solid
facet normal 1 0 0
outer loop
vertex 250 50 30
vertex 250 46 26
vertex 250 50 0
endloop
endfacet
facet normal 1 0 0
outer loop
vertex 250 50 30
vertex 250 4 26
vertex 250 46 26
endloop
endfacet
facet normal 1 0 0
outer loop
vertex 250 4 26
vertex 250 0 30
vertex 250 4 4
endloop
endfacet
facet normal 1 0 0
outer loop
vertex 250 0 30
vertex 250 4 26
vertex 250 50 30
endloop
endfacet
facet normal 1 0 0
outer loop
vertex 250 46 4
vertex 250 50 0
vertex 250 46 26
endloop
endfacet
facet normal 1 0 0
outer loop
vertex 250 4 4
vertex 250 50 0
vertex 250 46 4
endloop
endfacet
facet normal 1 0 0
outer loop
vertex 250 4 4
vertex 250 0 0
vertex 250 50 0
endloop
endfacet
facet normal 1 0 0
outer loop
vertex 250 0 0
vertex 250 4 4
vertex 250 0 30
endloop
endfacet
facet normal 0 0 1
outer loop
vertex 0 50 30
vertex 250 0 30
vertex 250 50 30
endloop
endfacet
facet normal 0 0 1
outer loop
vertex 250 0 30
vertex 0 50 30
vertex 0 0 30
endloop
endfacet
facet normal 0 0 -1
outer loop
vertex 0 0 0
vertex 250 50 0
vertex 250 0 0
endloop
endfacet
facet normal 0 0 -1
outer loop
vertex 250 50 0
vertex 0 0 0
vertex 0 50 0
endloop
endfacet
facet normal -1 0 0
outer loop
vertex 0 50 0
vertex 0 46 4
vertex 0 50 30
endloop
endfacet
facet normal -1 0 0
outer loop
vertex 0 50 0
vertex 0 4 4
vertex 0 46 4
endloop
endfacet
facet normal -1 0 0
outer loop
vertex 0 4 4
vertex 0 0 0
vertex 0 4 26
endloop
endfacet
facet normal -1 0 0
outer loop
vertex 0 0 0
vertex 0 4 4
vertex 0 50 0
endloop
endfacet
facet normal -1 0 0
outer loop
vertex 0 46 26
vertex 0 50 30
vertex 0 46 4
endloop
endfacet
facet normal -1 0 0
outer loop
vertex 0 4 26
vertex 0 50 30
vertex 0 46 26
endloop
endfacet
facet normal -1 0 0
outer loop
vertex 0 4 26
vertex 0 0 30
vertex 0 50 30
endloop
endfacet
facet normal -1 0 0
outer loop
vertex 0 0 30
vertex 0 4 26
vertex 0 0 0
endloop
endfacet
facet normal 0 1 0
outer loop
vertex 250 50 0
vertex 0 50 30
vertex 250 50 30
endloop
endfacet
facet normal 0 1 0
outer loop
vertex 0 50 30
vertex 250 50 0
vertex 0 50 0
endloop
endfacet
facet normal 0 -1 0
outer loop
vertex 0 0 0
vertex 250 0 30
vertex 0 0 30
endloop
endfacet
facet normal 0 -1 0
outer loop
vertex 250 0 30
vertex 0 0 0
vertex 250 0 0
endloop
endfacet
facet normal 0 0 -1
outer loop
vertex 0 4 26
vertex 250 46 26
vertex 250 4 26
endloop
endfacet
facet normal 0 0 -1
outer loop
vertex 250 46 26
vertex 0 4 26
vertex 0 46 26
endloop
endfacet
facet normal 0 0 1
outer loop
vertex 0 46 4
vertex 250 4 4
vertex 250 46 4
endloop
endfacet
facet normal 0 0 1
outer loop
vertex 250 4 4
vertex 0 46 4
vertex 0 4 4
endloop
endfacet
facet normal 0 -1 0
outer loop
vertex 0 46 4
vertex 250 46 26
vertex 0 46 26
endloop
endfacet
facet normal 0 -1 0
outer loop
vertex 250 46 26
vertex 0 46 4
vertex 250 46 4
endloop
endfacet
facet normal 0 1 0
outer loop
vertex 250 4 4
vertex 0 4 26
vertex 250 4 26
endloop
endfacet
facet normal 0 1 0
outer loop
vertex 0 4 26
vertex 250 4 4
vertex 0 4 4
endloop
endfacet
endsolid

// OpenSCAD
$fn = 32;

// ----------------------------------------------------------------------
// Box beam: 200-250 mm hollow beam
// ----------------------------------------------------------------------

// --- parameters (mm) ---
beam_l = 250;             // beam length, X
beam_w = 50;              // beam width, Y
beam_h = 30;              // beam height, Z
wall = 4;                 // wall thickness

difference() {
  cube([beam_l, beam_w, beam_h]);
  translate([-1, wall, wall])
    cube([beam_l + 2, beam_w - 2 * wall, beam_h - 2 * wall]);
}
